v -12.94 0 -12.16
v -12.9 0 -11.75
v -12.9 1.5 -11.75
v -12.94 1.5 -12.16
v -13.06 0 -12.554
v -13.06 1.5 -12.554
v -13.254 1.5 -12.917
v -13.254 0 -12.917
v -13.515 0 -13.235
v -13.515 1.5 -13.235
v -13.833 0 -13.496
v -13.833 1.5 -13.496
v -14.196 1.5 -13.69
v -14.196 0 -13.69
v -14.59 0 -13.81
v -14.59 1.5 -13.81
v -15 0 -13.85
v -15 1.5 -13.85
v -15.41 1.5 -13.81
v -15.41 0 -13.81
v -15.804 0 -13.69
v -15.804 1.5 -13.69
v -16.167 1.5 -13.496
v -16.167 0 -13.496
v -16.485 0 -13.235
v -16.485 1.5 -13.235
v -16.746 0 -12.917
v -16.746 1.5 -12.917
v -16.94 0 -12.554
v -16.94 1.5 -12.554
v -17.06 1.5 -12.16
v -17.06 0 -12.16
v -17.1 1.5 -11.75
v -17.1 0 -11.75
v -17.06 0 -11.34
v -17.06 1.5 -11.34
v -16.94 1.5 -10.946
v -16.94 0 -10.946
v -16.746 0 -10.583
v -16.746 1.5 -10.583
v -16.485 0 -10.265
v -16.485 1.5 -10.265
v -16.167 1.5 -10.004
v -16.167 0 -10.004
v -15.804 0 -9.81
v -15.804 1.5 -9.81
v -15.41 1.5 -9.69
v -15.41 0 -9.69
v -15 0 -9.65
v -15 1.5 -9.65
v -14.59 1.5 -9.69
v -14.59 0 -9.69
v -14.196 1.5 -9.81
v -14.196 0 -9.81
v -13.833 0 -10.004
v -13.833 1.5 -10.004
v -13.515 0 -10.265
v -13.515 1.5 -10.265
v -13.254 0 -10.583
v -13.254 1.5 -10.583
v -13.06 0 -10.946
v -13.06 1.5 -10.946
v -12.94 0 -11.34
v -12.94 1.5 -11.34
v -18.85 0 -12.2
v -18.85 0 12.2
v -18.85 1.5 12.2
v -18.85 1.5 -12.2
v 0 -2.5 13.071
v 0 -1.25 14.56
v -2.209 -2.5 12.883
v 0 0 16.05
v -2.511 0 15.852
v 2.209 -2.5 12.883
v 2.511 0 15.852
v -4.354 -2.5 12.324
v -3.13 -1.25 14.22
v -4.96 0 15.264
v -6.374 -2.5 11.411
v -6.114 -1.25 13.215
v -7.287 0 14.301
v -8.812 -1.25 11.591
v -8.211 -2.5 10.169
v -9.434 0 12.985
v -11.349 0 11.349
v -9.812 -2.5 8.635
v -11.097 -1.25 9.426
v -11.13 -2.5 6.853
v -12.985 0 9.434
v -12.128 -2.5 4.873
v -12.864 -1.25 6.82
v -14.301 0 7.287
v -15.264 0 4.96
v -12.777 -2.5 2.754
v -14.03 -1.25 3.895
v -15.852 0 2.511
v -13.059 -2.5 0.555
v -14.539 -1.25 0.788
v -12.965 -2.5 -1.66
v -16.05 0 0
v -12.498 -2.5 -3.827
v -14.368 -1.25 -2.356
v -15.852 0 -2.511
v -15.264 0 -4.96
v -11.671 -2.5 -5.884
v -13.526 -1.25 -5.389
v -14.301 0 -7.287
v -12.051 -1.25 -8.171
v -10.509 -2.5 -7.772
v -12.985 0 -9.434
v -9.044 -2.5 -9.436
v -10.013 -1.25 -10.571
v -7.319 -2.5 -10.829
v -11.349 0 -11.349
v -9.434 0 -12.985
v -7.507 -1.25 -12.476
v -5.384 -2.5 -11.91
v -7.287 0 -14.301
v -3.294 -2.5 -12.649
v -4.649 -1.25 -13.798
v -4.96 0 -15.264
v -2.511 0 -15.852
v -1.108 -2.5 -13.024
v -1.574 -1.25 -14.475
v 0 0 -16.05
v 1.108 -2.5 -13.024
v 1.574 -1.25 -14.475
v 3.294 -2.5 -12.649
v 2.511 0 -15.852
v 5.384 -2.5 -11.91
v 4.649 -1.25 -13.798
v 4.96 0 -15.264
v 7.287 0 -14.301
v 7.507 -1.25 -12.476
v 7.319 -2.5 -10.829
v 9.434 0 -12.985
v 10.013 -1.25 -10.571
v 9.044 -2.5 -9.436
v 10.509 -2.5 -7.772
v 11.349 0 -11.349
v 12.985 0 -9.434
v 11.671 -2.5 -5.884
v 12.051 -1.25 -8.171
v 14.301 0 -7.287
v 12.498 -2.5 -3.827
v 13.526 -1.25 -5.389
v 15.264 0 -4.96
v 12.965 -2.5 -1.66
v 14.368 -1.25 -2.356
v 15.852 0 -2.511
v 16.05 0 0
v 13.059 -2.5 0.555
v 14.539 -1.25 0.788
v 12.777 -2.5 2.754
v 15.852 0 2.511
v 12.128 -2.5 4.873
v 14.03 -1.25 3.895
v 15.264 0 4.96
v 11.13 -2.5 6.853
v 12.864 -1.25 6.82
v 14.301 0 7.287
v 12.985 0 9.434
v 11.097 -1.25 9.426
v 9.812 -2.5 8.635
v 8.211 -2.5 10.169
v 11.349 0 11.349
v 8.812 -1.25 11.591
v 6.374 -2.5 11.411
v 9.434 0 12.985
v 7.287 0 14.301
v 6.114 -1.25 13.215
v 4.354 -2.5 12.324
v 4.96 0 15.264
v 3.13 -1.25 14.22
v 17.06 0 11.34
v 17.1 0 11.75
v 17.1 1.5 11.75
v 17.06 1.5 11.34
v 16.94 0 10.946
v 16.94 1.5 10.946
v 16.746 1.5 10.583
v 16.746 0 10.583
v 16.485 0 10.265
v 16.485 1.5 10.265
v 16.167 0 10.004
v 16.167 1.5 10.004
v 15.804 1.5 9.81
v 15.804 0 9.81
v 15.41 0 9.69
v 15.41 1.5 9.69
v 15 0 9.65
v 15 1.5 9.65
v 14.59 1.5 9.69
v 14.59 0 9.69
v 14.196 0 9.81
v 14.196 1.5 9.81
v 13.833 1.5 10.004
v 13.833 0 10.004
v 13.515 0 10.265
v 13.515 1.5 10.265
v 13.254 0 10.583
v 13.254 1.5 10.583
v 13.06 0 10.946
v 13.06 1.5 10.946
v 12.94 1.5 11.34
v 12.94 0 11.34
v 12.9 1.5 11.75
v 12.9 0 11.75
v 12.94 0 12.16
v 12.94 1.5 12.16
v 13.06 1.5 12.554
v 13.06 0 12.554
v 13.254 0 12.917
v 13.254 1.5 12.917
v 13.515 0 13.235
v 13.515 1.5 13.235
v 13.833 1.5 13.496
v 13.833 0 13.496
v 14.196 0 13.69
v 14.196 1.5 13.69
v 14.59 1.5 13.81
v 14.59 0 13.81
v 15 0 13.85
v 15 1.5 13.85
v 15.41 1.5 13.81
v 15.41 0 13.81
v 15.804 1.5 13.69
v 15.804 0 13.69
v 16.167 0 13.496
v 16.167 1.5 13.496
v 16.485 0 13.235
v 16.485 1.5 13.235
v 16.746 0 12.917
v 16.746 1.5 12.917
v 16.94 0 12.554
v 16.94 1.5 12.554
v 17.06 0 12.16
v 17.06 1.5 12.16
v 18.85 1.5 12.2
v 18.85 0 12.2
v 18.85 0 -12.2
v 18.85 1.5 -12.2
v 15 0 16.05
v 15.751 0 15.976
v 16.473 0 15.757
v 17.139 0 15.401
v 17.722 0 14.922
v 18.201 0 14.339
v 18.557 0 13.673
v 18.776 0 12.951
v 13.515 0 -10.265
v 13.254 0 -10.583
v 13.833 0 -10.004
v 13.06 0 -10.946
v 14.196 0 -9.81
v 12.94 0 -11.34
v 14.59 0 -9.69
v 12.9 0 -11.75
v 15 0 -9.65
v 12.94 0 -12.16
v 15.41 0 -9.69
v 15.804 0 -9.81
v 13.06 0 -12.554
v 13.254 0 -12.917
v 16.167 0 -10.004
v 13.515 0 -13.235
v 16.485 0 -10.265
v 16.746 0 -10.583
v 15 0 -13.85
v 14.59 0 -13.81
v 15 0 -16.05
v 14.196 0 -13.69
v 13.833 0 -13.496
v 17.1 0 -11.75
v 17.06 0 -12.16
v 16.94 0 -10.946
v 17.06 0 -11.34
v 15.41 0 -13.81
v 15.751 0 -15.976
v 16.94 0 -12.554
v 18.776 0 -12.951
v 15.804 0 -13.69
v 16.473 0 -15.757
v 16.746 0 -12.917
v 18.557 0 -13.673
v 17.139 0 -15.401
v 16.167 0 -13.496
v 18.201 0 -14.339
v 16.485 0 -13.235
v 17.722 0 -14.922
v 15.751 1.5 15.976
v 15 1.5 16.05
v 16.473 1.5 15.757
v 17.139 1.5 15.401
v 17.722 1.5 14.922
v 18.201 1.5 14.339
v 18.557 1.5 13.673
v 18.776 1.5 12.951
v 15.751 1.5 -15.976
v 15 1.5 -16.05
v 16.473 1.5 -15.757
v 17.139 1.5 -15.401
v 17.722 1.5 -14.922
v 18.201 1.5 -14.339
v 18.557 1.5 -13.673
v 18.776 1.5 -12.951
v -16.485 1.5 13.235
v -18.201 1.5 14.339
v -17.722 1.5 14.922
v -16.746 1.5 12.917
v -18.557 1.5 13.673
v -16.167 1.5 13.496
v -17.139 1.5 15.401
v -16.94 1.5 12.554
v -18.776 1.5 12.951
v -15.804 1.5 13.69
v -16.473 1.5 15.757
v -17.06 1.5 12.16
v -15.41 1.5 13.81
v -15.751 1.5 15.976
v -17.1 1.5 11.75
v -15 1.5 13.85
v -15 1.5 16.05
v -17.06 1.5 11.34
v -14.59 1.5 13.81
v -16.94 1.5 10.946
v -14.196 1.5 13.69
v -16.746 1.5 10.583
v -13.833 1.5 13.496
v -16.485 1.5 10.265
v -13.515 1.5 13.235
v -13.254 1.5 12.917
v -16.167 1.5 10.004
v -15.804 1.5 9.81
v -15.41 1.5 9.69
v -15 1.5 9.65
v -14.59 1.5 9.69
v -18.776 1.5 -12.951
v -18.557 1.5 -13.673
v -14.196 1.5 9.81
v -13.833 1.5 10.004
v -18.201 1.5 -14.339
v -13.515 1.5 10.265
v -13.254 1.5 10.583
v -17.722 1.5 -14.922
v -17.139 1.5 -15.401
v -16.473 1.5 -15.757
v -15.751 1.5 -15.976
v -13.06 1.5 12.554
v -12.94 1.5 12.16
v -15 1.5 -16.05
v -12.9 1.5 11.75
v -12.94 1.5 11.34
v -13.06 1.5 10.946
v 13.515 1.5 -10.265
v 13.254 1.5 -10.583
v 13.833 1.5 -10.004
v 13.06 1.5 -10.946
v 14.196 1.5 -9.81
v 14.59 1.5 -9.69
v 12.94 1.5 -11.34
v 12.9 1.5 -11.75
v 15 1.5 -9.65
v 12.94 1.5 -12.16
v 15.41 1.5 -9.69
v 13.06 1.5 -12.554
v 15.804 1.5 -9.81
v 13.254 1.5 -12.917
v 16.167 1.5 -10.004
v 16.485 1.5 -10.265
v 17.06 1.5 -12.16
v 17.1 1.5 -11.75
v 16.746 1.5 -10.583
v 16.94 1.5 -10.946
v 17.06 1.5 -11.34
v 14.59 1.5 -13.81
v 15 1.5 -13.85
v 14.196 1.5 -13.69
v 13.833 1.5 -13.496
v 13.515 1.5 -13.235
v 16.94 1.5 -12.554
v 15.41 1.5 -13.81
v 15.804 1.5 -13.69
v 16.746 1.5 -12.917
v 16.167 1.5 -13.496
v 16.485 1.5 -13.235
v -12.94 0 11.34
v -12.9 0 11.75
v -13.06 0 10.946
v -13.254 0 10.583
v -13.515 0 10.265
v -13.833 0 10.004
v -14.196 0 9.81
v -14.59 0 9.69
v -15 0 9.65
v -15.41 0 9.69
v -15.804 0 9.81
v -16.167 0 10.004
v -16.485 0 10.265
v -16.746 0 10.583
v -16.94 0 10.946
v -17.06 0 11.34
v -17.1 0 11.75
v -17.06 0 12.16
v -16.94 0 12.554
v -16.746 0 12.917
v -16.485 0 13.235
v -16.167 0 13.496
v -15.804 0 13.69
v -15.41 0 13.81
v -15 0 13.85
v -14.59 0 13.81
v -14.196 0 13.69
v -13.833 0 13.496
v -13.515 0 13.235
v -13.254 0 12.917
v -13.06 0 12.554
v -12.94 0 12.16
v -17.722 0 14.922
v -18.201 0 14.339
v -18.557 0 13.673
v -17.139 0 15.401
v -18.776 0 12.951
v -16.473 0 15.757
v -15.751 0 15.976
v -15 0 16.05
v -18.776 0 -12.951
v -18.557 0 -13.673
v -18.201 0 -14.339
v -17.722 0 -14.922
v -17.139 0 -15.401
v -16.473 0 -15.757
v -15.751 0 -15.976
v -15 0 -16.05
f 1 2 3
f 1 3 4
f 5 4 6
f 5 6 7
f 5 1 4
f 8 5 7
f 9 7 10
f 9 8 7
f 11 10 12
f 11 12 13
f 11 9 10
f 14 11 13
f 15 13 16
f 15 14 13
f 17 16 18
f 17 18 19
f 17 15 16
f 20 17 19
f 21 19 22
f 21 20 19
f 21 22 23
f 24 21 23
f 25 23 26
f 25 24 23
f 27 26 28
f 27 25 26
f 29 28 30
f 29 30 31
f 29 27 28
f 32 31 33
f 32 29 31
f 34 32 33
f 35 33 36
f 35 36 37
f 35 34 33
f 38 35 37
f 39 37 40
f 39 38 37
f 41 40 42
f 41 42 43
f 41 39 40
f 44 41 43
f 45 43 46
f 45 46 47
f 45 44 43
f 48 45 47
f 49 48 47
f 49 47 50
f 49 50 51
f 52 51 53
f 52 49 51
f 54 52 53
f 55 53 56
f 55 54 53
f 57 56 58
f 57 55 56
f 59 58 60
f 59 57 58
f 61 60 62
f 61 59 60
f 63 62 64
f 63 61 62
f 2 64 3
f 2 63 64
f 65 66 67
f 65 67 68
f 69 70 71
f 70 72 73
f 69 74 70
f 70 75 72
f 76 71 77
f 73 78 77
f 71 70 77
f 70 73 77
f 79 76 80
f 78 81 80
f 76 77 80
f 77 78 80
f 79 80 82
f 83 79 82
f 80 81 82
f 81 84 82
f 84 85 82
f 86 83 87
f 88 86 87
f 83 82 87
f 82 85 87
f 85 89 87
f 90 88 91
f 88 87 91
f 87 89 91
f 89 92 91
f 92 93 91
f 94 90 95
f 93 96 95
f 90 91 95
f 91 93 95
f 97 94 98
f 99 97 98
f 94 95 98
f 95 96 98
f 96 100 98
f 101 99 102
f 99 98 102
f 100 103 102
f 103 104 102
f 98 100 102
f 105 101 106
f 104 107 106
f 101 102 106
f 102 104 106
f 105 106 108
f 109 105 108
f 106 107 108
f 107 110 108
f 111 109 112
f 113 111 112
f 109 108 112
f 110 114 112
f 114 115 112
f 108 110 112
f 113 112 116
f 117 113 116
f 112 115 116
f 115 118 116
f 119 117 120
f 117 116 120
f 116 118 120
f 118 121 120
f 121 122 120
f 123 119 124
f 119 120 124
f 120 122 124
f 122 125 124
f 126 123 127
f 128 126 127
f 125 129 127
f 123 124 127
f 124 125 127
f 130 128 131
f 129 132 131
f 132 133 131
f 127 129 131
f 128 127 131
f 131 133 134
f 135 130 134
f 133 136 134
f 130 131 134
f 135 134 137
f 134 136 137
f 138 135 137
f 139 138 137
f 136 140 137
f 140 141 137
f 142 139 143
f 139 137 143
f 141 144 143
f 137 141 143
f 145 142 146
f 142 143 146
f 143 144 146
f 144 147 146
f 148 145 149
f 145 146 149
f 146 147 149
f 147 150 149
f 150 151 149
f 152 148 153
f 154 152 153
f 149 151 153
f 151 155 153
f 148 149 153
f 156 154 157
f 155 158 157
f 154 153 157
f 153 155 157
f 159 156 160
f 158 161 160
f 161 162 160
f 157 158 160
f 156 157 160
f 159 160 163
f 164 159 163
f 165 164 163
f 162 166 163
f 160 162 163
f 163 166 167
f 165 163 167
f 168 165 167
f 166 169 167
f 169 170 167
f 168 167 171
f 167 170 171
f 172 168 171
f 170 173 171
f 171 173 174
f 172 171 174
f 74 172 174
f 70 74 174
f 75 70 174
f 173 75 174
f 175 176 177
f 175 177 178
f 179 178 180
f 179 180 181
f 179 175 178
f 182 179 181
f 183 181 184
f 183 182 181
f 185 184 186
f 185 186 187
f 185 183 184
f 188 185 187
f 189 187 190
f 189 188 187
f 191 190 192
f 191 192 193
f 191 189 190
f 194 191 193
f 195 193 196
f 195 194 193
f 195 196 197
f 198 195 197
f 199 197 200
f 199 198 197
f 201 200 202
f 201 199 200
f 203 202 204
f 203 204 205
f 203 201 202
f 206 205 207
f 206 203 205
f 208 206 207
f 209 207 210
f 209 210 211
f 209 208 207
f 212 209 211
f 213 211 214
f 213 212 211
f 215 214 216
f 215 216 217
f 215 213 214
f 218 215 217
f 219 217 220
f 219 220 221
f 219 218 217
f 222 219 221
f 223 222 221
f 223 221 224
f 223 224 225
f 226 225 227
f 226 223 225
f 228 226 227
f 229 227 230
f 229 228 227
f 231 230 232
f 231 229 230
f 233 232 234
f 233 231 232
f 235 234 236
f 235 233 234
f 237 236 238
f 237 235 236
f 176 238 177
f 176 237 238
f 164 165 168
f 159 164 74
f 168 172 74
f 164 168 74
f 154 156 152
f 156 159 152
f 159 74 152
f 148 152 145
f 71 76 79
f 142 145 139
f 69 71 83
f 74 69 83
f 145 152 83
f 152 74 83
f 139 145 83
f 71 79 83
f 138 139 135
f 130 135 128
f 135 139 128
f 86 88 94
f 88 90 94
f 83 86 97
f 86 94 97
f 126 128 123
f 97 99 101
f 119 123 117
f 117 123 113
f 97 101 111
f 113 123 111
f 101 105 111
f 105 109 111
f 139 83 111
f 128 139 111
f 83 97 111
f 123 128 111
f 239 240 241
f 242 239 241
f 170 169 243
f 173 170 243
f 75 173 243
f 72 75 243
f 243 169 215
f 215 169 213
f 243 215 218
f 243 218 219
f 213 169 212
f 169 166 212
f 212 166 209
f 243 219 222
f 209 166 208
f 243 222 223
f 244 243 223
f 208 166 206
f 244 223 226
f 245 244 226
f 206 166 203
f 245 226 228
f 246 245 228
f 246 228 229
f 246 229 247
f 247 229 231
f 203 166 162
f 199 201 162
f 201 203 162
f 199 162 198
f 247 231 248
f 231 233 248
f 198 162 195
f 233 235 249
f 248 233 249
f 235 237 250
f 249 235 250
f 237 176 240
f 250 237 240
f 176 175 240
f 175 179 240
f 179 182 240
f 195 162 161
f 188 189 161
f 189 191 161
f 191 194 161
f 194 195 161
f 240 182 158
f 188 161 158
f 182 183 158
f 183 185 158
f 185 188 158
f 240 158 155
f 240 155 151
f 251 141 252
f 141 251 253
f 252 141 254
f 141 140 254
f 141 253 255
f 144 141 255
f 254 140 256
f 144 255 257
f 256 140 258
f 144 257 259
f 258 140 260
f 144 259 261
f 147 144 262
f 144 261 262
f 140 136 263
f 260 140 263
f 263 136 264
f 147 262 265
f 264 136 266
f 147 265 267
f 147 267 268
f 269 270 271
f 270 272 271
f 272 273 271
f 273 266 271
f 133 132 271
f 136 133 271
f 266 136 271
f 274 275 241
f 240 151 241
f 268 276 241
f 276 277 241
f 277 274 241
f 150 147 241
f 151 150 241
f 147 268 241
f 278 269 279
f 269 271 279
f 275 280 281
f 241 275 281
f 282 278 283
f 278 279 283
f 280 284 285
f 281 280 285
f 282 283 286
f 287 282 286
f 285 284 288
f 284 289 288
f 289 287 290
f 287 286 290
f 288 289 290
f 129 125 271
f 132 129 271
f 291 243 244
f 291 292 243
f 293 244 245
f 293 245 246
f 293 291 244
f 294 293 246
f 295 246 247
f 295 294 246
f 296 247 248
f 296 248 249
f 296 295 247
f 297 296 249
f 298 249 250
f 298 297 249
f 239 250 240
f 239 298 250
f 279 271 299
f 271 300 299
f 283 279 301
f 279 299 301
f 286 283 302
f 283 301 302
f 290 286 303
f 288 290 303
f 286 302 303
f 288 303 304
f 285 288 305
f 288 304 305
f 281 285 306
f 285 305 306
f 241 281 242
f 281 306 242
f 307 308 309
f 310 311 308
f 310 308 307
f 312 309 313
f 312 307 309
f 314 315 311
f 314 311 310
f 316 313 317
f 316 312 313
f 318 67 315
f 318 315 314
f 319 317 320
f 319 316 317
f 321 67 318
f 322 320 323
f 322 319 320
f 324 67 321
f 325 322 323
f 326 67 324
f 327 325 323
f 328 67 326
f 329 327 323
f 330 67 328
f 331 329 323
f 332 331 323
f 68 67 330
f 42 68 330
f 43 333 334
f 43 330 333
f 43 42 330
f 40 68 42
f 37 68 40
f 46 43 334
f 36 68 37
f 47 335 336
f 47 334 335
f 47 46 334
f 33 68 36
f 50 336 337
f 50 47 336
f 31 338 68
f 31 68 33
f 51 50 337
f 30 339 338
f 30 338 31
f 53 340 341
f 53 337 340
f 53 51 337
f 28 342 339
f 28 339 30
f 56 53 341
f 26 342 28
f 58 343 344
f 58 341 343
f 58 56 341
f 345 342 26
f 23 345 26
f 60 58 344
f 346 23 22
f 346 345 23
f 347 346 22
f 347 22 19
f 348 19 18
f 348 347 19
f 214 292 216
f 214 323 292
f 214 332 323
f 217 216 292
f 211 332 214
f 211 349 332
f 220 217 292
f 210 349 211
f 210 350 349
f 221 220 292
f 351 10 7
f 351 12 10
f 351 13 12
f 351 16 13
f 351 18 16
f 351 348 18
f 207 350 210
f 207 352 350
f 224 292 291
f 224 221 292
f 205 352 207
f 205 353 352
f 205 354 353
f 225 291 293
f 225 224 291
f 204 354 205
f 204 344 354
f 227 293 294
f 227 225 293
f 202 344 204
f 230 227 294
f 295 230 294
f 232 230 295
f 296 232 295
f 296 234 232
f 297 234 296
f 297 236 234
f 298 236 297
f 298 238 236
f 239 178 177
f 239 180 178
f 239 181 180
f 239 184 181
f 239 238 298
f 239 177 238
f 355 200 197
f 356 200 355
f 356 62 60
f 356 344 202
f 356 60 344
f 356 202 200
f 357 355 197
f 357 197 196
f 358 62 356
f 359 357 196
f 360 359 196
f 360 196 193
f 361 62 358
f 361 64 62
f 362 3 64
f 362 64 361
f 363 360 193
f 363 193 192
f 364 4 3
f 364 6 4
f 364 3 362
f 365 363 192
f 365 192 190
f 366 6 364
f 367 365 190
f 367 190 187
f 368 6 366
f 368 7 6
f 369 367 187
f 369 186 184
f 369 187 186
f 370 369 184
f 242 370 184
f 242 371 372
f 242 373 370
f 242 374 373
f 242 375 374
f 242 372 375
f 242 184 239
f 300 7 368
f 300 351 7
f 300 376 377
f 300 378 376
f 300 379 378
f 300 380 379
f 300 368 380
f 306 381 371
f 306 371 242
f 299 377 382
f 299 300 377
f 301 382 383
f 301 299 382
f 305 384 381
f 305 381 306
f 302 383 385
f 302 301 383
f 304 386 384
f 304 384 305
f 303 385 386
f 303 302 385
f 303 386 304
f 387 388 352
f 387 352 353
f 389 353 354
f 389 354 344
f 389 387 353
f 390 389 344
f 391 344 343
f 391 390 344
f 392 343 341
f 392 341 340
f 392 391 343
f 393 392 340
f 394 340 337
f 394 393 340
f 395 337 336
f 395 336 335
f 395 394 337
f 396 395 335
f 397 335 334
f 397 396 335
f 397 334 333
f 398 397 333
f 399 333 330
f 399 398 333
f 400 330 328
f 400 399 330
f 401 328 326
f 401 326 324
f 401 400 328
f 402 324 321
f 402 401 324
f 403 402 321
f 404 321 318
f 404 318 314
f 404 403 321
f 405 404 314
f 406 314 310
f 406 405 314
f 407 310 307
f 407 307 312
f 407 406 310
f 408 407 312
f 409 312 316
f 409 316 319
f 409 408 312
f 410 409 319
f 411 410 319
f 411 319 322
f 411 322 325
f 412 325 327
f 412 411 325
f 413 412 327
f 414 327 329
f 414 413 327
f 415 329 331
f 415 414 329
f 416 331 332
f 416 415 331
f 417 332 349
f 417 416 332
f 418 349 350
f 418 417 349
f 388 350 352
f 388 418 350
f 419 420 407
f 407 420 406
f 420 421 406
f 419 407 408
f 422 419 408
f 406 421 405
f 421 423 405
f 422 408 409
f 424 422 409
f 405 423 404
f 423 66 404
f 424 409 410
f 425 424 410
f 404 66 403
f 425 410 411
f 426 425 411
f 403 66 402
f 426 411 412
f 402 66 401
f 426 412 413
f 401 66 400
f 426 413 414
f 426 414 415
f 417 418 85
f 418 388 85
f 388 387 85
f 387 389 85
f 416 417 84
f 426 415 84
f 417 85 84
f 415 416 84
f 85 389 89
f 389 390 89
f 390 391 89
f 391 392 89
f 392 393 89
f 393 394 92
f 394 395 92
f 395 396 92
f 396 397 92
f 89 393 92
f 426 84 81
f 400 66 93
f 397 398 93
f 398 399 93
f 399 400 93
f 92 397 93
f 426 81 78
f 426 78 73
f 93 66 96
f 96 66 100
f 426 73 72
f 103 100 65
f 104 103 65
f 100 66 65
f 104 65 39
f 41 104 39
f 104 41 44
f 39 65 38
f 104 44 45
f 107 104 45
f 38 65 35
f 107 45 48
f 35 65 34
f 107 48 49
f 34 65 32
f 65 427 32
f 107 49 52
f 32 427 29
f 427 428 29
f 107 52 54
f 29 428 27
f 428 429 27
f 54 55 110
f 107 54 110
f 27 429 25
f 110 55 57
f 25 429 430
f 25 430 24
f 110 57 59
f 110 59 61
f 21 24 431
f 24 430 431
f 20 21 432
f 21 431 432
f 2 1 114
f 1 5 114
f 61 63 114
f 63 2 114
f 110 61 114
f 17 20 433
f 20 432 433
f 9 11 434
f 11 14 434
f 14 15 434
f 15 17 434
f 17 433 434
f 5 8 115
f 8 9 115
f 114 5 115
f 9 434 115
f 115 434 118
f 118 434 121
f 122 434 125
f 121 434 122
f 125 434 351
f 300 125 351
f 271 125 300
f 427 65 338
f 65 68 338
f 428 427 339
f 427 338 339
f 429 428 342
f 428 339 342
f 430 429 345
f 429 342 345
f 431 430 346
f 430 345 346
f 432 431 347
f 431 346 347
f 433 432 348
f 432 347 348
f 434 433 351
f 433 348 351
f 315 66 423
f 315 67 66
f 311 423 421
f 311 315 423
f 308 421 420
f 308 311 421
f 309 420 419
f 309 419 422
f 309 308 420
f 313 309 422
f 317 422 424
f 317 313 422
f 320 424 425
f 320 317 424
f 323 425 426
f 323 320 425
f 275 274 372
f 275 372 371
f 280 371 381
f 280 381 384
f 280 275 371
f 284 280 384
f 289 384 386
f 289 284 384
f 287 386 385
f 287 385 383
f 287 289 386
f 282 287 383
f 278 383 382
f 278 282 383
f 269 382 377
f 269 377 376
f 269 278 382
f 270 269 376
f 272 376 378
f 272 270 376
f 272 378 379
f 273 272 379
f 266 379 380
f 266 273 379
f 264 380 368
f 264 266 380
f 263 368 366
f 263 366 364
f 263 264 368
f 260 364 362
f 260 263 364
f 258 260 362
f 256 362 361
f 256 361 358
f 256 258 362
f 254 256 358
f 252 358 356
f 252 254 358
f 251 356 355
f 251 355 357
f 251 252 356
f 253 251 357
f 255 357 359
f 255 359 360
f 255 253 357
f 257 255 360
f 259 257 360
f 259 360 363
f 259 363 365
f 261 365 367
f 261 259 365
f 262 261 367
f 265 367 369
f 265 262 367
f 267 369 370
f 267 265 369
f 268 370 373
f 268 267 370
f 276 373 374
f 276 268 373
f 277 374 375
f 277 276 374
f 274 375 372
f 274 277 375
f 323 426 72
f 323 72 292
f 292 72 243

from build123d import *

# Parameters (mm, degrees)
SKETCH1_W           = 37.7
SKETCH1_H           = 32.1
SKETCH1_R           = 2.1
BOSS_EXTRUDE1_DEPTH = 1.5
FILLET1_R           = 3.85


with BuildPart() as part:
    # Sketch1 → Boss-Extrude1 (new body)
    with BuildSketch(Plane(origin=(0, 0, 0), x_dir=(1, 0, 0), z_dir=(0, 1, 0))):
        Rectangle(SKETCH1_W, SKETCH1_H)
        with Locations((15, 11.75)):
            Circle(SKETCH1_R, mode=Mode.SUBTRACT)
        with Locations((15, -11.75)):
            Circle(SKETCH1_R, mode=Mode.SUBTRACT)
        with Locations((-15, 11.75)):
            Circle(SKETCH1_R, mode=Mode.SUBTRACT)
        with Locations((-15, -11.75)):
            Circle(SKETCH1_R, mode=Mode.SUBTRACT)
    extrude(amount=BOSS_EXTRUDE1_DEPTH)

    # Fillet1
    fillet1_edges = [part.edges().sort_by_distance(p)[0] for p in [
        (-18.85, 0.75, -16.05),
        (18.85, 0.75, -16.05),
        (18.85, 0.75, 16.05),
        (-18.85, 0.75, 16.05),
    ]]
    fillet(fillet1_edges, radius=FILLET1_R)

    # Sketch2 → Revolve1 (revolve)
    with BuildSketch(Plane(origin=(0, 0, 0), x_dir=(0, 0, -1), z_dir=(1, 0, 0))):
        Polygon((0, 0), (0, -2.5), (-13.070616019, -2.5), (-16.05, 0), align=None)
    revolve(axis=Axis((0, 0, 0), (0, -1, 0)))


solid = part.part
